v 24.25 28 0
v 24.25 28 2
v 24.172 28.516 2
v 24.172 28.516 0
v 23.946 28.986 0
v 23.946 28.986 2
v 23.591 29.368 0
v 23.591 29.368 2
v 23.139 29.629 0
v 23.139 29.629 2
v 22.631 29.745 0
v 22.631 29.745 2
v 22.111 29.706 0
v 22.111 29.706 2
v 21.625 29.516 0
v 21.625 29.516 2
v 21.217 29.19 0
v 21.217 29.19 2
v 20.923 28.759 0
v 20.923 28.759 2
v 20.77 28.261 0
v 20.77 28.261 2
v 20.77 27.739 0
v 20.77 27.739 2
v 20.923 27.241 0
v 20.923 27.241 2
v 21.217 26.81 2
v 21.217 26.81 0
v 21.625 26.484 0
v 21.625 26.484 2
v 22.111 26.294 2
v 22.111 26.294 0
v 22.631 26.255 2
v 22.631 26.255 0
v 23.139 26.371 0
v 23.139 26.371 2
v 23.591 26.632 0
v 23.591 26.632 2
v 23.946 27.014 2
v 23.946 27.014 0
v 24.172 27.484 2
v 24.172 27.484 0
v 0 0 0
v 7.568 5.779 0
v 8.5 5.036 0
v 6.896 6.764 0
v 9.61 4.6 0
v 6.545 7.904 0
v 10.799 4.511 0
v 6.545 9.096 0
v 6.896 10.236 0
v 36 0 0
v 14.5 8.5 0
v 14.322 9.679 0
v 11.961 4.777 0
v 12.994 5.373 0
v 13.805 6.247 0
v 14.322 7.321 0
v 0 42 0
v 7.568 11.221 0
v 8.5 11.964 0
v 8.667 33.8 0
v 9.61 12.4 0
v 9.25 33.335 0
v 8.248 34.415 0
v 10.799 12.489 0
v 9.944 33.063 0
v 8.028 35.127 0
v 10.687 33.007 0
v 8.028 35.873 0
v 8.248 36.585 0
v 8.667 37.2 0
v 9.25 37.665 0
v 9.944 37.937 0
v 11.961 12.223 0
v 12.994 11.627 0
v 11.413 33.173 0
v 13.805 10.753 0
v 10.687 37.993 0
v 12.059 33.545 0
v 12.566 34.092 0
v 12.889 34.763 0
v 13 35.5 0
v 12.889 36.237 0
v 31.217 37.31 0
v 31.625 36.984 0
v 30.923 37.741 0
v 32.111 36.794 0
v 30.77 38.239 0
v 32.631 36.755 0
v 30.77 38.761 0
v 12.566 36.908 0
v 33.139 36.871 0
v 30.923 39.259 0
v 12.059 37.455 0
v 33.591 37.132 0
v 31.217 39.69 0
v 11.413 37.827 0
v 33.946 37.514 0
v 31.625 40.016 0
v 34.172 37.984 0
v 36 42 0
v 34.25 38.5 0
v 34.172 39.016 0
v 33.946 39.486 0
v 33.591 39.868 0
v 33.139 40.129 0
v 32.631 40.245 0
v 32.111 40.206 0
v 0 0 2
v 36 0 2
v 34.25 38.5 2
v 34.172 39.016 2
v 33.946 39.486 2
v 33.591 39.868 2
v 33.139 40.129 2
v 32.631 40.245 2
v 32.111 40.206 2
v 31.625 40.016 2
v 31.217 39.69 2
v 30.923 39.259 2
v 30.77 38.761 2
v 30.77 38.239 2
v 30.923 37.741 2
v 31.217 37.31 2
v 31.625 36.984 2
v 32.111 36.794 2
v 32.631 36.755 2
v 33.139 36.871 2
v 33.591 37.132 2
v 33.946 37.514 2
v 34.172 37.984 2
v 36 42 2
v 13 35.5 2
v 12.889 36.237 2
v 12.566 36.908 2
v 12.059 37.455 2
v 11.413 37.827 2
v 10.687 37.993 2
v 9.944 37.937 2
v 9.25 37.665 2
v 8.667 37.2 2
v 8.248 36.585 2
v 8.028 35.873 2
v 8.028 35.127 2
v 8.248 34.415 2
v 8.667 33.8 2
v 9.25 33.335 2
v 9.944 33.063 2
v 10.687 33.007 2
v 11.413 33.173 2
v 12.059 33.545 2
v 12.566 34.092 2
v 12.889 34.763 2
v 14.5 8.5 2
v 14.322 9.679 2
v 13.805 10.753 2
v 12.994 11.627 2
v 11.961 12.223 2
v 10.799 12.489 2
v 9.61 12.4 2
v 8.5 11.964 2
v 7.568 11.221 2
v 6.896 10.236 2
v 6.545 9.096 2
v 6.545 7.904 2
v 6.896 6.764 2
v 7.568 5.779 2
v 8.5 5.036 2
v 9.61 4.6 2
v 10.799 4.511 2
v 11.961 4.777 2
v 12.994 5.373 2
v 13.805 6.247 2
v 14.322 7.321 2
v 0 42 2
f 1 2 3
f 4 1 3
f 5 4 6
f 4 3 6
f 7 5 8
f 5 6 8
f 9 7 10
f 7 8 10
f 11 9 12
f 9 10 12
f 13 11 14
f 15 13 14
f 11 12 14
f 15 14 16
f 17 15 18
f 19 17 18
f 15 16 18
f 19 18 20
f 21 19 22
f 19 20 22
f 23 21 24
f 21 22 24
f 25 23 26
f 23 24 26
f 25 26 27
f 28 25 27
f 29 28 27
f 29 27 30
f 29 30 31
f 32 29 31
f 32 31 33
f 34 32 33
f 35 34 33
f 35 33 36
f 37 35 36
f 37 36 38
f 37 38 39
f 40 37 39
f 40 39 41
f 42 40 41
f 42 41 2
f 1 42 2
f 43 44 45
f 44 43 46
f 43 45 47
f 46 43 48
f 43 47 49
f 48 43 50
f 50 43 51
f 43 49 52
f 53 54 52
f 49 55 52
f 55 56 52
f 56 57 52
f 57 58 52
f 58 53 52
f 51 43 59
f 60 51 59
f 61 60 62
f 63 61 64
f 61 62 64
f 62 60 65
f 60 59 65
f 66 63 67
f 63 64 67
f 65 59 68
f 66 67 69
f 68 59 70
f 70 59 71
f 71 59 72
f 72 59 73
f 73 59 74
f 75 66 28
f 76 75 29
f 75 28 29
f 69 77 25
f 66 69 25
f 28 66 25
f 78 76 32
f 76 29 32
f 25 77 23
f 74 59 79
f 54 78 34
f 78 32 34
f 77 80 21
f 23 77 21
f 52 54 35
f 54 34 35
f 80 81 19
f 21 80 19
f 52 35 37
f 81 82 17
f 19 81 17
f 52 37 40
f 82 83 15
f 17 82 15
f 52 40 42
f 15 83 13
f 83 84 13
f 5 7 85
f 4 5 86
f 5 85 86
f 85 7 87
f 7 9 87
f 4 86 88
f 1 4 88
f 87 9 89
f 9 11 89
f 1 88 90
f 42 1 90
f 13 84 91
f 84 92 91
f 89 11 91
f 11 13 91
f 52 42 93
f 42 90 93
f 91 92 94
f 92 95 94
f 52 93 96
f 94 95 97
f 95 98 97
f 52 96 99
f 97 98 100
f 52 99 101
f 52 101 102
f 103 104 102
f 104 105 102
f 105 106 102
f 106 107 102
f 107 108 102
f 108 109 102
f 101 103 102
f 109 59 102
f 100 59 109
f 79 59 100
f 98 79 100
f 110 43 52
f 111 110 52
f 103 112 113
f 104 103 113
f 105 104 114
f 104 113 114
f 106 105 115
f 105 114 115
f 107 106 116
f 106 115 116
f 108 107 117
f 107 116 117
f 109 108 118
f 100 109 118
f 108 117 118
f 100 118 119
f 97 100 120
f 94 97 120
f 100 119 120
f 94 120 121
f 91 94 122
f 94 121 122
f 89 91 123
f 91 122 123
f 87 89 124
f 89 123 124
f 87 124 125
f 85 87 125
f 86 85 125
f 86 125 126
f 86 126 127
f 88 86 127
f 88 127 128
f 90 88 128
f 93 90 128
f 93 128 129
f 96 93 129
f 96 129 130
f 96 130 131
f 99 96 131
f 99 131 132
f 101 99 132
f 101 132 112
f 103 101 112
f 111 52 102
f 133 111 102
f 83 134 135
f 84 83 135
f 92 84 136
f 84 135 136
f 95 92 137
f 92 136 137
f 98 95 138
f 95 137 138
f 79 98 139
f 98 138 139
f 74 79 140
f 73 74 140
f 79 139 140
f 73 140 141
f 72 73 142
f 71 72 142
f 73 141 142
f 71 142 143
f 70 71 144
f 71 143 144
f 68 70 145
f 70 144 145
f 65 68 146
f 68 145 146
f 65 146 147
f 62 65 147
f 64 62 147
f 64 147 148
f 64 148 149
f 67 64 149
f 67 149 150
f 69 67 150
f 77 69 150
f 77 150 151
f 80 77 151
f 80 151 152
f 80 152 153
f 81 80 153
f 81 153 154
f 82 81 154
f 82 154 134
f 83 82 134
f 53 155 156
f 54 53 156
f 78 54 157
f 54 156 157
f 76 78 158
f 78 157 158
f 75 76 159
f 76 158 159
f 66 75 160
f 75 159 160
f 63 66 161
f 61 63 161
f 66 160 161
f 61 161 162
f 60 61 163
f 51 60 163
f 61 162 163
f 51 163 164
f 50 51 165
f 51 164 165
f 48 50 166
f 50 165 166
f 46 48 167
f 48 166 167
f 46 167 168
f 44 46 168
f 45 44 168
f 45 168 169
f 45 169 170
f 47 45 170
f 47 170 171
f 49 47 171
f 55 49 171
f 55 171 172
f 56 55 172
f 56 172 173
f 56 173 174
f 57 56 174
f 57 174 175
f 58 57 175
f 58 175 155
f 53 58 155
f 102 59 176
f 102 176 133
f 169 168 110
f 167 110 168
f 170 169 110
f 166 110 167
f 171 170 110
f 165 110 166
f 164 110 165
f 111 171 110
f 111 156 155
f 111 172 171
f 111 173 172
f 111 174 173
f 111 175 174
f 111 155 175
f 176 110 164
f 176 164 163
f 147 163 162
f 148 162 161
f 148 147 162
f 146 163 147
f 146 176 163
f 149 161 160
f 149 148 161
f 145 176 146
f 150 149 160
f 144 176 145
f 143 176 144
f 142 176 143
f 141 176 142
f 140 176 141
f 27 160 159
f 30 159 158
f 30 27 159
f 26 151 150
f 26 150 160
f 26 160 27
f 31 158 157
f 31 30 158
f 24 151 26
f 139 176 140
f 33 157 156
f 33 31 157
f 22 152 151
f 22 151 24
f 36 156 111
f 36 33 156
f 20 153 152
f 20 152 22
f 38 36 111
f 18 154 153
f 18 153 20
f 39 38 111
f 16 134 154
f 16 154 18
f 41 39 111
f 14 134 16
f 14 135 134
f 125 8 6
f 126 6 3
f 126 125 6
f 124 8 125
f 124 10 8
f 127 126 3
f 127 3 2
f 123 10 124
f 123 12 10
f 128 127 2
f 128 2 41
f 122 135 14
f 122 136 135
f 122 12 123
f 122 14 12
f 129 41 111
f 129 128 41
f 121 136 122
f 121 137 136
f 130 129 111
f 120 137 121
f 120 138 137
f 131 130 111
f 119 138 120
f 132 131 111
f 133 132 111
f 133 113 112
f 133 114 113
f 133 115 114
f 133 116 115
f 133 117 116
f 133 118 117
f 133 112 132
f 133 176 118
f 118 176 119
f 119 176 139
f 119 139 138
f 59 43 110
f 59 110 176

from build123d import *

# Parameters (mm, degrees)
SKETCH_1_W          = 36
SKETCH_1_H          = 42
EXTRUDE_1_DEPTH     = 2
SKETCH_2_R          = 1.75
SKETCH_2_R_2        = 2.5
CUT_EXTRUDE_1_DEPTH = 56.353410012
SKETCH_3_R          = 4
CUT_EXTRUDE_2_DEPTH = 56.353410012


with BuildPart() as part:
    # 草图1 → 凸台-拉伸1 (new body)
    with BuildSketch(Plane.XY):
        with Locations((18, 21)):
            Rectangle(SKETCH_1_W, SKETCH_1_H)
    extrude(amount=EXTRUDE_1_DEPTH)

    # 草图2 → 切除-拉伸1 (cut, through all)
    with BuildSketch(Plane.XY.offset(2)):
        with Locations((32.5, 38.5)):
            Circle(SKETCH_2_R)
        with Locations((22.5, 28)):
            Circle(SKETCH_2_R)
        with Locations((10.5, 35.5)):
            Circle(SKETCH_2_R_2)
    extrude(amount=-CUT_EXTRUDE_1_DEPTH, mode=Mode.SUBTRACT)

    # 草图3 → 切除-拉伸2 (cut, through all)
    with BuildSketch(Plane.XY.offset(2)):
        with Locations((10.5, 8.5)):
            Circle(SKETCH_3_R)
    extrude(amount=-CUT_EXTRUDE_2_DEPTH, mode=Mode.SUBTRACT)


solid = part.part
